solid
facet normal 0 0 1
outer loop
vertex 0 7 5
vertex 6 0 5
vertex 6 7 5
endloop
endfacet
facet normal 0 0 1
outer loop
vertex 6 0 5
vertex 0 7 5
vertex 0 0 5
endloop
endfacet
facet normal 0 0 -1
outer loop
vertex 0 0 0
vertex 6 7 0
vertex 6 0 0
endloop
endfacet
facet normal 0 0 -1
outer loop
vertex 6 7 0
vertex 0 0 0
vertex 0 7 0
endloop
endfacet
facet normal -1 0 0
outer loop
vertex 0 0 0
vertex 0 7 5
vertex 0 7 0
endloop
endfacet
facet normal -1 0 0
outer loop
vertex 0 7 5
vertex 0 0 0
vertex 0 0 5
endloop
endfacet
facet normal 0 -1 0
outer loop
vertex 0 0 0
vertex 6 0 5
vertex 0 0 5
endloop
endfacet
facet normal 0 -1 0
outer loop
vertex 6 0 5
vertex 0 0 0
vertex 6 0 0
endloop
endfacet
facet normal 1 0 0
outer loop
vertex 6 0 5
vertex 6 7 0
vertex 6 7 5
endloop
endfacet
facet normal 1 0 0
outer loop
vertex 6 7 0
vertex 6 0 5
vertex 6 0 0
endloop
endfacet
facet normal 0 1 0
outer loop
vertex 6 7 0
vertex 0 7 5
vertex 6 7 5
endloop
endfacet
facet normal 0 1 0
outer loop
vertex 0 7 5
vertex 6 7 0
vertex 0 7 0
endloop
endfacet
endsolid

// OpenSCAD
translate([1.5, 1.0, 2.5]) color([0.799945824478888, 0.5165278007752844, 0.9155142682747232]) cube([3, 2, 5], center=true);
translate([4.5, 1.0, 2.5]) color([0.06635468620874474, 0.13049414784187097, 0.3004482911175872]) cube([3, 2, 5], center=true);
translate([1.0, 3.5, 2.5]) color([0.7588987264331779, 0.4485890964462933, 0.8619033855251227]) cube([2, 3, 5], center=true);
translate([3.0, 3.5, 2.5]) color([0.8006454493762514, 0.8686955098516022, 0.4607350972935428]) cube([2, 3, 5], center=true);
translate([5.0, 3.5, 2.5]) color([0.37132186818867685, 0.38223256097056324, 0.5298076607467874]) cube([2, 3, 5], center=true);
translate([1.5, 6.0, 2.5]) color([0.033618014856222844, 0.09064689039119589, 0.7941451579713075]) cube([3, 2, 5], center=true);
translate([4.5, 6.0, 2.5]) color([0.5179983582932232, 0.6001422851572377, 0.07635810782734587]) cube([3, 2, 5], center=true);
